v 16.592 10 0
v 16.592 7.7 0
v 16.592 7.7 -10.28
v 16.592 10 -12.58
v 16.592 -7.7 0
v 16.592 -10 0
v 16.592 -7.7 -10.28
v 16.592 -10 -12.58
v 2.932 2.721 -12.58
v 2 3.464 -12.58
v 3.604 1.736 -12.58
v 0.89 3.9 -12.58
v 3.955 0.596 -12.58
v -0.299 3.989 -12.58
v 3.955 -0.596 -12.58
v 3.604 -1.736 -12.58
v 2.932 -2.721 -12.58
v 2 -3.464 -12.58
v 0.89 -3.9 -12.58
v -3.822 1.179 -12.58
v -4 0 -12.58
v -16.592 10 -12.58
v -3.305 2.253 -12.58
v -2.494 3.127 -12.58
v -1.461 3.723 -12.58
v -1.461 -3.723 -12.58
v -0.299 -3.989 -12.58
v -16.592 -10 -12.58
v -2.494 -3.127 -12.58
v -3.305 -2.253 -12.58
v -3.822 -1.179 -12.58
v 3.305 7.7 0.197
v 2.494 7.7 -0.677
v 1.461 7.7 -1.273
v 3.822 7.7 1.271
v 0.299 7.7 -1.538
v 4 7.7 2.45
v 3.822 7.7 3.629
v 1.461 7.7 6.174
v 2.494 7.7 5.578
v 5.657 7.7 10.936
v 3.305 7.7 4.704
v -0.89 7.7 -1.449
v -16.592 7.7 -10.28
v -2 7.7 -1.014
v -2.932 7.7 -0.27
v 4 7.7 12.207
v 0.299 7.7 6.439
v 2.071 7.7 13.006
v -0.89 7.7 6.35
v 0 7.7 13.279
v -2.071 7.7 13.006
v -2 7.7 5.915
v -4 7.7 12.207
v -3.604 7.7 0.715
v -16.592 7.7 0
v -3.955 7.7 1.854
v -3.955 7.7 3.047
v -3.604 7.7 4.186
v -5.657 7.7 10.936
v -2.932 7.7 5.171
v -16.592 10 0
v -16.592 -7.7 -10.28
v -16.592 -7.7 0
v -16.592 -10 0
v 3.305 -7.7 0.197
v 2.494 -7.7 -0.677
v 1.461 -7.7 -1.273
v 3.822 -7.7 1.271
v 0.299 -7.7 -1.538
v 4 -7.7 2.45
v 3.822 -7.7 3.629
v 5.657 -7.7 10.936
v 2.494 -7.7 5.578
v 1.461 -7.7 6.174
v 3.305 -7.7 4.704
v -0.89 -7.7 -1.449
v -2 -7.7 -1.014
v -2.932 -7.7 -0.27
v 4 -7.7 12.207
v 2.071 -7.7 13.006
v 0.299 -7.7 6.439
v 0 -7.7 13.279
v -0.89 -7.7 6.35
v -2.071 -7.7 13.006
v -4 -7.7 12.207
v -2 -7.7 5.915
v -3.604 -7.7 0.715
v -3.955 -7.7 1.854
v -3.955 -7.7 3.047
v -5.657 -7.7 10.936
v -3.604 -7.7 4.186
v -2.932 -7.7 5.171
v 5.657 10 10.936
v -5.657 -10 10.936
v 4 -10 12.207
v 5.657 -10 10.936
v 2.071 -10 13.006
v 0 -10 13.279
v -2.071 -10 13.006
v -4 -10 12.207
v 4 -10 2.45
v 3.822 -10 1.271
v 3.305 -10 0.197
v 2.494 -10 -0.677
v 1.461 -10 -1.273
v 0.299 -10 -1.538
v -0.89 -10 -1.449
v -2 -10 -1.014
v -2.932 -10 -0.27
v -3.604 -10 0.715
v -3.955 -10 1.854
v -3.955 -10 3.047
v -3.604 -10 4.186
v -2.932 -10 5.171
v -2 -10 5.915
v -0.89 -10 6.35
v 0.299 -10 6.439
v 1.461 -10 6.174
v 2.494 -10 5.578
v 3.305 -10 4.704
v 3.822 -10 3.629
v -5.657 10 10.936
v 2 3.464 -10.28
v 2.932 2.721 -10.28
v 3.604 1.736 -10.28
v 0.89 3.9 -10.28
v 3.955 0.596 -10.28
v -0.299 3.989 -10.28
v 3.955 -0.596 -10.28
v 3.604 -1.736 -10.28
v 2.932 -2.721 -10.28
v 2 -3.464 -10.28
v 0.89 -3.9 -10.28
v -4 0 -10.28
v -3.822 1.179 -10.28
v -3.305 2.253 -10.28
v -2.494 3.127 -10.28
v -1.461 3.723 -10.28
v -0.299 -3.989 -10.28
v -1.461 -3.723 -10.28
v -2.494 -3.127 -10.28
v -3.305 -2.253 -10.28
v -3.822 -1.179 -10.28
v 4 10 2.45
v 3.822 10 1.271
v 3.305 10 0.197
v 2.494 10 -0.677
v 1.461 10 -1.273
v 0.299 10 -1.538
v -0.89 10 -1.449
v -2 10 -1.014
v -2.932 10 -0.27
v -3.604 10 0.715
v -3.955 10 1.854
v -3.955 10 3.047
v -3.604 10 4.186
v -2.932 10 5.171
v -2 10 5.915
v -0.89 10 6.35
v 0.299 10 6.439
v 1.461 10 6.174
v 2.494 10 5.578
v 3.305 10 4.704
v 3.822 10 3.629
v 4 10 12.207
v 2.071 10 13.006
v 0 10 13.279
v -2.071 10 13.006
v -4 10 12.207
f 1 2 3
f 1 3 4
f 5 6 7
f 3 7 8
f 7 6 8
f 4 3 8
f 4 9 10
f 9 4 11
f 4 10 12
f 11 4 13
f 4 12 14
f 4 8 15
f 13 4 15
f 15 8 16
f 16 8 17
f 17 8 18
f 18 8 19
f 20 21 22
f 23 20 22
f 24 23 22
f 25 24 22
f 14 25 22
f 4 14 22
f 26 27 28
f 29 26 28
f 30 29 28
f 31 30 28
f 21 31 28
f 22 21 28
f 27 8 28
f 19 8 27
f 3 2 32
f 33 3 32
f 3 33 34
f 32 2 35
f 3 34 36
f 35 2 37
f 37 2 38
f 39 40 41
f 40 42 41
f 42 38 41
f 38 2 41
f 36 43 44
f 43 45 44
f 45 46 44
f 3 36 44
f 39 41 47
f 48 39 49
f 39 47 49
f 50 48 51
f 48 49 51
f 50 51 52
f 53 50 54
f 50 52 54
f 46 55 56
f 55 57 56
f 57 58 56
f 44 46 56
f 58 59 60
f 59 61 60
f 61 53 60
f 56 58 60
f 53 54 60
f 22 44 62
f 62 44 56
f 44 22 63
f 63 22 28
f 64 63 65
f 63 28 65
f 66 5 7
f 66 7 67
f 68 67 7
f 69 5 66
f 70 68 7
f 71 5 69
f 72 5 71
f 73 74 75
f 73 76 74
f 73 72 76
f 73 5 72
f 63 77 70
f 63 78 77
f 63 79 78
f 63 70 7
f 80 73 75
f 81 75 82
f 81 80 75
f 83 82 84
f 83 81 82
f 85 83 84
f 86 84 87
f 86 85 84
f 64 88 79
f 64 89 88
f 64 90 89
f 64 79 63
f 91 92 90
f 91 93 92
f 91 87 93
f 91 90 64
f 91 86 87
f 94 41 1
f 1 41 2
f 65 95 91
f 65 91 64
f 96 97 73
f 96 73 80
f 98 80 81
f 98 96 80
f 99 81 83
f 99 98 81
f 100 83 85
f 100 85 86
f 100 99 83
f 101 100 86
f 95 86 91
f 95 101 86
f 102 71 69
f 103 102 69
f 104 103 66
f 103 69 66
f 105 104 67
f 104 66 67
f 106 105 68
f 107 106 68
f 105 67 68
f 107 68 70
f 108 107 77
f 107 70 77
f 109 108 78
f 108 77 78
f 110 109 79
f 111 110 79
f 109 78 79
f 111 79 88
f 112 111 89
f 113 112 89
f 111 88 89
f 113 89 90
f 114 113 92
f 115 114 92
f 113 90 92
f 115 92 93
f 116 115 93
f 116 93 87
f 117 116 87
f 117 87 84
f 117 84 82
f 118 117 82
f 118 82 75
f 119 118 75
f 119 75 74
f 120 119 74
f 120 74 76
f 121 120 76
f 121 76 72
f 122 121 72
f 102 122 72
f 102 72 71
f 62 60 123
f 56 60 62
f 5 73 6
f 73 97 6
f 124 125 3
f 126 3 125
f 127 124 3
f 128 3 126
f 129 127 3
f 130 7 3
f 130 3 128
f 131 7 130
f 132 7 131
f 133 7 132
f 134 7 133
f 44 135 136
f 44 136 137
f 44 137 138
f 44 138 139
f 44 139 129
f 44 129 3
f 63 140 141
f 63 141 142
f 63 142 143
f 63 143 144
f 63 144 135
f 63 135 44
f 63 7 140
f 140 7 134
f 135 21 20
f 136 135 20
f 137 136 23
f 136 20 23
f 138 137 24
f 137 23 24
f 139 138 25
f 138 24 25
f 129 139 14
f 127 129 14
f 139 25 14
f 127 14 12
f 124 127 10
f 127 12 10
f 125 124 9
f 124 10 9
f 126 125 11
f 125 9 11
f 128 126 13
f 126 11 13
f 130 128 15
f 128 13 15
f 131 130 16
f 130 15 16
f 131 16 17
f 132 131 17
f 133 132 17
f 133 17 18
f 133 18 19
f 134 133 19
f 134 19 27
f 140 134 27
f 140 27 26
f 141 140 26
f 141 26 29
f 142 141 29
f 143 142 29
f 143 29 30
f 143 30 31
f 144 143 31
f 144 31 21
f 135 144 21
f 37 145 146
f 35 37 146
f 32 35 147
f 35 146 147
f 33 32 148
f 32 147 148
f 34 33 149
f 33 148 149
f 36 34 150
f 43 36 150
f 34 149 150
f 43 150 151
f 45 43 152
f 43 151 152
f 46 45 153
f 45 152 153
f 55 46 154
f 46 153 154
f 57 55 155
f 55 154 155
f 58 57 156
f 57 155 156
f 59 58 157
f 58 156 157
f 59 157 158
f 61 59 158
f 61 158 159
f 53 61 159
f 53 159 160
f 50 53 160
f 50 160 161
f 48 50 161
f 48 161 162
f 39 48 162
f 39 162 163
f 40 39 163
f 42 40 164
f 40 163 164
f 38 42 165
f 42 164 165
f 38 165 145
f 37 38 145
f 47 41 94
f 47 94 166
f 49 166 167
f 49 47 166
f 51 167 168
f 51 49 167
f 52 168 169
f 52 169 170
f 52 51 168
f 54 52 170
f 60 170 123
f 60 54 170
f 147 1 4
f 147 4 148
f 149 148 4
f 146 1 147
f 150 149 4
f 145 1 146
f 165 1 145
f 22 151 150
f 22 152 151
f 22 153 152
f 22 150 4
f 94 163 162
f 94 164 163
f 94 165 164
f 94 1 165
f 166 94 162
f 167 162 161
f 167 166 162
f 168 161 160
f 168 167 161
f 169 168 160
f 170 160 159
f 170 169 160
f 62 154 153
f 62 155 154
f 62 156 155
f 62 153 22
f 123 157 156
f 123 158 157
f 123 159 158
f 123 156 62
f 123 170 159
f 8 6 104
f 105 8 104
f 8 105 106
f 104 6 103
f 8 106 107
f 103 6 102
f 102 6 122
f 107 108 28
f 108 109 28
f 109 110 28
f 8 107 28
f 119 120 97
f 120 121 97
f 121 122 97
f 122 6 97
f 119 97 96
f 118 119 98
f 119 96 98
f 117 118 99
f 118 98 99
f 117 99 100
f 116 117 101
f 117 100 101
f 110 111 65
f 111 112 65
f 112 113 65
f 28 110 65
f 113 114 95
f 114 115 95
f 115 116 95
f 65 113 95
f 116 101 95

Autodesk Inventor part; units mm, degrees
ref_plane "YZ Plane" through (0, 0, 0) normal (1, 0, 0) x (0, 1, 0)
ref_plane "XZ Plane" through (0, 0, 0) normal (0, 1, 0) x (-1, 0, 0)
ref_plane "XY Plane" through (0, 0, 0) normal (0, 0, 1) x (1, 0, 0)
sketch "スケッチ1" plane through (0, 0, 0) normal (0, 1, 0) x (-1, 0, 0)
  line L0 (0, 16.5925) -> (16.5925, 0)
  line L1 (0, 16.5925) -> (-16.5925, 0)
  line L2 (-16.5925, 0) -> (-16.5925, -12.5795)
  line L3 (-16.5925, -12.5795) -> (16.5925, -12.5795)
  line L4 (16.5925, -12.5795) -> (16.5925, 0)
  line L5 (0, -18.4139) -> (0, 22.427) projected
  line L6 (23.2296, 0) -> (-23.2296, 0) projected
  point P0 (0, 0)
  point P1 (0, -12.5795)
  dimension "d0" = 90
extrude "押し出し1" add sketch "スケッチ1" along normal mid plane 20
shell "シェル1" thickness 2.3 removed faces 4 at (-11.0617, 3.3333, 5.5308) at (-16.5925, 3.3333, -8.3863) at (5.5308, 3.3333, 11.0617) at (16.5925, 3.3333, -4.1932)
sketch "スケッチ3" plane through (16.5925, 10, -12.5795) normal (0, 0, -1) x (-1, 0, 0)
  circle A0 centre (16.5925, -10) radius 4
  dimension "d9" = 8
extrude "押し出し3" cut sketch "スケッチ3" against normal through all
sketch "スケッチ4" plane through (0, 10, 0) normal (0, 1, 0) x (1, 0, 0)
  circle A0 centre (0, -2.4504) radius 4
  line L0 (0, -16.5925) -> (16.5925, 0) projected
  line L1 (-16.5925, 0) -> (0, -16.5925) projected
  point P0 (0, 0)
  dimension "d12" = 10
  dimension "d13" = 10
  dimension "d14" = 8
extrude "押し出し4" cut sketch "スケッチ4" against normal through all
fillet "フィレット1" radius 8 2 edges at (0, 8.85, 16.5925) (0, -8.85, 16.5925)
properties part number "clip" material "アルミニウム 6061"
